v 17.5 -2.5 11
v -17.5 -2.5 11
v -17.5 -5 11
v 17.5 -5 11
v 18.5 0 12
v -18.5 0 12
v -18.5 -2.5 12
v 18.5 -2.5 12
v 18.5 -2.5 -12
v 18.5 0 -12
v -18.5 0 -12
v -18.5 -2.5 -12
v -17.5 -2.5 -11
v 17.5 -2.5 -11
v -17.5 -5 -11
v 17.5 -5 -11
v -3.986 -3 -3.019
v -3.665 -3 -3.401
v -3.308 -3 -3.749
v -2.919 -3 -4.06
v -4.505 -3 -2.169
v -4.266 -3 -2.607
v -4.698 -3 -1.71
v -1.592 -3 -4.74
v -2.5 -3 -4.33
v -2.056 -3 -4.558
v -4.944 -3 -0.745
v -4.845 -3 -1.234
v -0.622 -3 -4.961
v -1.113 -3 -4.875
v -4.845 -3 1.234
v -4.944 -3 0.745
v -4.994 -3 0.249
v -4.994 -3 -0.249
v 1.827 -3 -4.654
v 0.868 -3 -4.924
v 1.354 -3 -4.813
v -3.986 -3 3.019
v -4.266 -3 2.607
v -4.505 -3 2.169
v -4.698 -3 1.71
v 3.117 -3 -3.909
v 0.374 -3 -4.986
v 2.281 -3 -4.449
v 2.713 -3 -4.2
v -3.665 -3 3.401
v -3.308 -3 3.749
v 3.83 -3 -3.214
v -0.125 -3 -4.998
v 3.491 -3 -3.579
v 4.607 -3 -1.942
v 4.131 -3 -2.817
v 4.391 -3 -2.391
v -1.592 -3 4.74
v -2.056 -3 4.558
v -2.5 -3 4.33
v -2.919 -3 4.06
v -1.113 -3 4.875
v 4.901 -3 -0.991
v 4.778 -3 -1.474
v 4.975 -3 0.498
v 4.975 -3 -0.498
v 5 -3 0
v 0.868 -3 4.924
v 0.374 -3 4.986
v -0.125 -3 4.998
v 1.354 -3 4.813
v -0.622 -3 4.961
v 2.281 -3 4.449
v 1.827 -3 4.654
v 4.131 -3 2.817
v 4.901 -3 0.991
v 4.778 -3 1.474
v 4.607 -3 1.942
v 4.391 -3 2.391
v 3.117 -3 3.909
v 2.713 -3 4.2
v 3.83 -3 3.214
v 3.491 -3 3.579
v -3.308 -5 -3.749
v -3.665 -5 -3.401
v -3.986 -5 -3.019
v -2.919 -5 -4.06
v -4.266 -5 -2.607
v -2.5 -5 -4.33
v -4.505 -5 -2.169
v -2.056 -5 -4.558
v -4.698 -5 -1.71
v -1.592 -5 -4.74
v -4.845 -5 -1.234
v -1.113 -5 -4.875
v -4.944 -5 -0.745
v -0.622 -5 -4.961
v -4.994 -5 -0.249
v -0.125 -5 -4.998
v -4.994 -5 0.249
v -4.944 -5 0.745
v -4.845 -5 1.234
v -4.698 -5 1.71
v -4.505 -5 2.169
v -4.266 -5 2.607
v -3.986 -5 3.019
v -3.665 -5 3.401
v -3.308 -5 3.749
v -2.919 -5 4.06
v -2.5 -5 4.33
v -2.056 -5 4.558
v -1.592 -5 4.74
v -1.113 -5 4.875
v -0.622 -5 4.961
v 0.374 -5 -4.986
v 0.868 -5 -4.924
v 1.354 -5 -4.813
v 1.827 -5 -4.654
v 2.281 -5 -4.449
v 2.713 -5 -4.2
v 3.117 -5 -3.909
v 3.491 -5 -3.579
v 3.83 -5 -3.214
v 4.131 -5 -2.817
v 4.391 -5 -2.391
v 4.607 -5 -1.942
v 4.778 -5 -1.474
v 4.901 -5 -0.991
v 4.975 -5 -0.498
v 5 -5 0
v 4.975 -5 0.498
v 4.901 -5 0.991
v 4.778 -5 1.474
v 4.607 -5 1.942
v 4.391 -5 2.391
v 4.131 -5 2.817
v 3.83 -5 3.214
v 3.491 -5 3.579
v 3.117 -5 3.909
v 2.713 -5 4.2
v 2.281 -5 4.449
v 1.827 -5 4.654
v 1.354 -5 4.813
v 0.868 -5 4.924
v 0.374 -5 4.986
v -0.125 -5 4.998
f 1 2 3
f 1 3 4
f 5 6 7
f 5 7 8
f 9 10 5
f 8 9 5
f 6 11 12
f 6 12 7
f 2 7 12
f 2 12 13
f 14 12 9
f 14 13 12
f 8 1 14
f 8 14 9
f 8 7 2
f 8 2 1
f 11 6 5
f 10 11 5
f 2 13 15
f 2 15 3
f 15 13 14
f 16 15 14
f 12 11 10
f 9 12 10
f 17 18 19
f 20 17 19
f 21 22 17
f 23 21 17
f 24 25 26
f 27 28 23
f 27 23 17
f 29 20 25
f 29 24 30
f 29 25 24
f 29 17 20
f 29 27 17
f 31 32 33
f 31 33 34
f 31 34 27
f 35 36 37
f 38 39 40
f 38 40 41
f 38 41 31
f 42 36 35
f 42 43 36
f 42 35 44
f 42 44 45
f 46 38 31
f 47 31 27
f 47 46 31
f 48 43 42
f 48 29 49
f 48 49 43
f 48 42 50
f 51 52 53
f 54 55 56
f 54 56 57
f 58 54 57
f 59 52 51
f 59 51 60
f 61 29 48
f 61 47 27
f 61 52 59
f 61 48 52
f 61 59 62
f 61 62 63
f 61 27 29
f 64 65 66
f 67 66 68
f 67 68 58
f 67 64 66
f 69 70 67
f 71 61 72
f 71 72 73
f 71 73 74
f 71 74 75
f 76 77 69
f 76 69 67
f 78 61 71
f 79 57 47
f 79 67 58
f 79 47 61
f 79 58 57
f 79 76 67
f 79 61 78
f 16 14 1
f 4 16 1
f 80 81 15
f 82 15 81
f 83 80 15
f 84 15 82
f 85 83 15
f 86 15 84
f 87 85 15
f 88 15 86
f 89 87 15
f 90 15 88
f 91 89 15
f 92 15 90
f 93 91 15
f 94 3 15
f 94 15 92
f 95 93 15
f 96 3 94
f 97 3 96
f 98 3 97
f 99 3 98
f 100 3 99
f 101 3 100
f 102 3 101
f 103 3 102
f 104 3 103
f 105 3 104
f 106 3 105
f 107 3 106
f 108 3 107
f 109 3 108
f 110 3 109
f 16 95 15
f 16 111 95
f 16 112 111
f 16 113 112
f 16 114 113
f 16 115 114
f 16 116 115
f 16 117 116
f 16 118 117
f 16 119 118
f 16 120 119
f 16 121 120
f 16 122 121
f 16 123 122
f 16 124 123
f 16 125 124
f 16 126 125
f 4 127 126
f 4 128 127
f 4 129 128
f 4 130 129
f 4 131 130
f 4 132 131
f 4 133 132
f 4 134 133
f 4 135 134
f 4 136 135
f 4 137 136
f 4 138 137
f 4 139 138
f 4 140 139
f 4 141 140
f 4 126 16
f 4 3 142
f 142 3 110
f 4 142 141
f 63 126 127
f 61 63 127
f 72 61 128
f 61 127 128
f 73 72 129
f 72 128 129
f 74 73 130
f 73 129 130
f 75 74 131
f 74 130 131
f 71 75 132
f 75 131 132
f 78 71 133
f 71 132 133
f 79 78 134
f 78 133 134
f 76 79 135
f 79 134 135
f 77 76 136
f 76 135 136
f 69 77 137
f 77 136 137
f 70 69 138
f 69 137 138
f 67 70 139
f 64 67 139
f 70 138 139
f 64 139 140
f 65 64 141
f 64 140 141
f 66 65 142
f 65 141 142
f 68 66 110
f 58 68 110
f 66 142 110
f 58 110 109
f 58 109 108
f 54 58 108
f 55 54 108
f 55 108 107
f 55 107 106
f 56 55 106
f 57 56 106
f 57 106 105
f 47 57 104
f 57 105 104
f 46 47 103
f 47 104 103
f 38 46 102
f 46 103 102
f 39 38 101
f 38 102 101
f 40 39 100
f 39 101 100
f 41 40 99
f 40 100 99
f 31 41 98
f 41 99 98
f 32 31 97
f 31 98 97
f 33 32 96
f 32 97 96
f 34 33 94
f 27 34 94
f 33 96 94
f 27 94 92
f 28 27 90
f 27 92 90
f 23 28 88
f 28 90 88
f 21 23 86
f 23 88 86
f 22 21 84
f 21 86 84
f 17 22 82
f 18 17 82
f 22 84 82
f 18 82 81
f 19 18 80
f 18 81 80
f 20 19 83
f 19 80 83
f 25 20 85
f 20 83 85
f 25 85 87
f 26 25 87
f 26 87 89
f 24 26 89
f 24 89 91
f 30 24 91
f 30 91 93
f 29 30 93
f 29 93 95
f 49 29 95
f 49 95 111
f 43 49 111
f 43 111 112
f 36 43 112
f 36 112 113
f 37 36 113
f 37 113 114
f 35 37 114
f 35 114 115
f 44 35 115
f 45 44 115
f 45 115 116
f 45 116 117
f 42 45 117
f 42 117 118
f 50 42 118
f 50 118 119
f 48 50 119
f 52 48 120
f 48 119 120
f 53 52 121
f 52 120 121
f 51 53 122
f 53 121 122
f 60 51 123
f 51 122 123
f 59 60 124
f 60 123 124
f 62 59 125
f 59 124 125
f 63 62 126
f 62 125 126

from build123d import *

# Parameters (mm, degrees)
F0_W     = 37
F0_H     = 24
F1_DEPTH = 2.5
F2_W     = 35
F2_H     = 22
F3_DEPTH = 2.5
F4_R     = 5
F5_DEPTH = 2


with BuildPart() as f1:
    # F0 (on Front) → F1 (new body)
    with BuildSketch(Plane.XZ):
        Rectangle(F0_W, F0_H)
    extrude(amount=F1_DEPTH)

    # F2 (on face) → F3 (join)
    with BuildSketch(Plane.XZ.offset(2.5)):
        Rectangle(F2_W, F2_H)
    extrude(amount=F3_DEPTH)

    # F4 (on face) → F5 (cut)
    with BuildSketch(Plane.XZ.offset(5)):
        Circle(F4_R)
    extrude(amount=-F5_DEPTH, mode=Mode.SUBTRACT)


solid = f1.part
